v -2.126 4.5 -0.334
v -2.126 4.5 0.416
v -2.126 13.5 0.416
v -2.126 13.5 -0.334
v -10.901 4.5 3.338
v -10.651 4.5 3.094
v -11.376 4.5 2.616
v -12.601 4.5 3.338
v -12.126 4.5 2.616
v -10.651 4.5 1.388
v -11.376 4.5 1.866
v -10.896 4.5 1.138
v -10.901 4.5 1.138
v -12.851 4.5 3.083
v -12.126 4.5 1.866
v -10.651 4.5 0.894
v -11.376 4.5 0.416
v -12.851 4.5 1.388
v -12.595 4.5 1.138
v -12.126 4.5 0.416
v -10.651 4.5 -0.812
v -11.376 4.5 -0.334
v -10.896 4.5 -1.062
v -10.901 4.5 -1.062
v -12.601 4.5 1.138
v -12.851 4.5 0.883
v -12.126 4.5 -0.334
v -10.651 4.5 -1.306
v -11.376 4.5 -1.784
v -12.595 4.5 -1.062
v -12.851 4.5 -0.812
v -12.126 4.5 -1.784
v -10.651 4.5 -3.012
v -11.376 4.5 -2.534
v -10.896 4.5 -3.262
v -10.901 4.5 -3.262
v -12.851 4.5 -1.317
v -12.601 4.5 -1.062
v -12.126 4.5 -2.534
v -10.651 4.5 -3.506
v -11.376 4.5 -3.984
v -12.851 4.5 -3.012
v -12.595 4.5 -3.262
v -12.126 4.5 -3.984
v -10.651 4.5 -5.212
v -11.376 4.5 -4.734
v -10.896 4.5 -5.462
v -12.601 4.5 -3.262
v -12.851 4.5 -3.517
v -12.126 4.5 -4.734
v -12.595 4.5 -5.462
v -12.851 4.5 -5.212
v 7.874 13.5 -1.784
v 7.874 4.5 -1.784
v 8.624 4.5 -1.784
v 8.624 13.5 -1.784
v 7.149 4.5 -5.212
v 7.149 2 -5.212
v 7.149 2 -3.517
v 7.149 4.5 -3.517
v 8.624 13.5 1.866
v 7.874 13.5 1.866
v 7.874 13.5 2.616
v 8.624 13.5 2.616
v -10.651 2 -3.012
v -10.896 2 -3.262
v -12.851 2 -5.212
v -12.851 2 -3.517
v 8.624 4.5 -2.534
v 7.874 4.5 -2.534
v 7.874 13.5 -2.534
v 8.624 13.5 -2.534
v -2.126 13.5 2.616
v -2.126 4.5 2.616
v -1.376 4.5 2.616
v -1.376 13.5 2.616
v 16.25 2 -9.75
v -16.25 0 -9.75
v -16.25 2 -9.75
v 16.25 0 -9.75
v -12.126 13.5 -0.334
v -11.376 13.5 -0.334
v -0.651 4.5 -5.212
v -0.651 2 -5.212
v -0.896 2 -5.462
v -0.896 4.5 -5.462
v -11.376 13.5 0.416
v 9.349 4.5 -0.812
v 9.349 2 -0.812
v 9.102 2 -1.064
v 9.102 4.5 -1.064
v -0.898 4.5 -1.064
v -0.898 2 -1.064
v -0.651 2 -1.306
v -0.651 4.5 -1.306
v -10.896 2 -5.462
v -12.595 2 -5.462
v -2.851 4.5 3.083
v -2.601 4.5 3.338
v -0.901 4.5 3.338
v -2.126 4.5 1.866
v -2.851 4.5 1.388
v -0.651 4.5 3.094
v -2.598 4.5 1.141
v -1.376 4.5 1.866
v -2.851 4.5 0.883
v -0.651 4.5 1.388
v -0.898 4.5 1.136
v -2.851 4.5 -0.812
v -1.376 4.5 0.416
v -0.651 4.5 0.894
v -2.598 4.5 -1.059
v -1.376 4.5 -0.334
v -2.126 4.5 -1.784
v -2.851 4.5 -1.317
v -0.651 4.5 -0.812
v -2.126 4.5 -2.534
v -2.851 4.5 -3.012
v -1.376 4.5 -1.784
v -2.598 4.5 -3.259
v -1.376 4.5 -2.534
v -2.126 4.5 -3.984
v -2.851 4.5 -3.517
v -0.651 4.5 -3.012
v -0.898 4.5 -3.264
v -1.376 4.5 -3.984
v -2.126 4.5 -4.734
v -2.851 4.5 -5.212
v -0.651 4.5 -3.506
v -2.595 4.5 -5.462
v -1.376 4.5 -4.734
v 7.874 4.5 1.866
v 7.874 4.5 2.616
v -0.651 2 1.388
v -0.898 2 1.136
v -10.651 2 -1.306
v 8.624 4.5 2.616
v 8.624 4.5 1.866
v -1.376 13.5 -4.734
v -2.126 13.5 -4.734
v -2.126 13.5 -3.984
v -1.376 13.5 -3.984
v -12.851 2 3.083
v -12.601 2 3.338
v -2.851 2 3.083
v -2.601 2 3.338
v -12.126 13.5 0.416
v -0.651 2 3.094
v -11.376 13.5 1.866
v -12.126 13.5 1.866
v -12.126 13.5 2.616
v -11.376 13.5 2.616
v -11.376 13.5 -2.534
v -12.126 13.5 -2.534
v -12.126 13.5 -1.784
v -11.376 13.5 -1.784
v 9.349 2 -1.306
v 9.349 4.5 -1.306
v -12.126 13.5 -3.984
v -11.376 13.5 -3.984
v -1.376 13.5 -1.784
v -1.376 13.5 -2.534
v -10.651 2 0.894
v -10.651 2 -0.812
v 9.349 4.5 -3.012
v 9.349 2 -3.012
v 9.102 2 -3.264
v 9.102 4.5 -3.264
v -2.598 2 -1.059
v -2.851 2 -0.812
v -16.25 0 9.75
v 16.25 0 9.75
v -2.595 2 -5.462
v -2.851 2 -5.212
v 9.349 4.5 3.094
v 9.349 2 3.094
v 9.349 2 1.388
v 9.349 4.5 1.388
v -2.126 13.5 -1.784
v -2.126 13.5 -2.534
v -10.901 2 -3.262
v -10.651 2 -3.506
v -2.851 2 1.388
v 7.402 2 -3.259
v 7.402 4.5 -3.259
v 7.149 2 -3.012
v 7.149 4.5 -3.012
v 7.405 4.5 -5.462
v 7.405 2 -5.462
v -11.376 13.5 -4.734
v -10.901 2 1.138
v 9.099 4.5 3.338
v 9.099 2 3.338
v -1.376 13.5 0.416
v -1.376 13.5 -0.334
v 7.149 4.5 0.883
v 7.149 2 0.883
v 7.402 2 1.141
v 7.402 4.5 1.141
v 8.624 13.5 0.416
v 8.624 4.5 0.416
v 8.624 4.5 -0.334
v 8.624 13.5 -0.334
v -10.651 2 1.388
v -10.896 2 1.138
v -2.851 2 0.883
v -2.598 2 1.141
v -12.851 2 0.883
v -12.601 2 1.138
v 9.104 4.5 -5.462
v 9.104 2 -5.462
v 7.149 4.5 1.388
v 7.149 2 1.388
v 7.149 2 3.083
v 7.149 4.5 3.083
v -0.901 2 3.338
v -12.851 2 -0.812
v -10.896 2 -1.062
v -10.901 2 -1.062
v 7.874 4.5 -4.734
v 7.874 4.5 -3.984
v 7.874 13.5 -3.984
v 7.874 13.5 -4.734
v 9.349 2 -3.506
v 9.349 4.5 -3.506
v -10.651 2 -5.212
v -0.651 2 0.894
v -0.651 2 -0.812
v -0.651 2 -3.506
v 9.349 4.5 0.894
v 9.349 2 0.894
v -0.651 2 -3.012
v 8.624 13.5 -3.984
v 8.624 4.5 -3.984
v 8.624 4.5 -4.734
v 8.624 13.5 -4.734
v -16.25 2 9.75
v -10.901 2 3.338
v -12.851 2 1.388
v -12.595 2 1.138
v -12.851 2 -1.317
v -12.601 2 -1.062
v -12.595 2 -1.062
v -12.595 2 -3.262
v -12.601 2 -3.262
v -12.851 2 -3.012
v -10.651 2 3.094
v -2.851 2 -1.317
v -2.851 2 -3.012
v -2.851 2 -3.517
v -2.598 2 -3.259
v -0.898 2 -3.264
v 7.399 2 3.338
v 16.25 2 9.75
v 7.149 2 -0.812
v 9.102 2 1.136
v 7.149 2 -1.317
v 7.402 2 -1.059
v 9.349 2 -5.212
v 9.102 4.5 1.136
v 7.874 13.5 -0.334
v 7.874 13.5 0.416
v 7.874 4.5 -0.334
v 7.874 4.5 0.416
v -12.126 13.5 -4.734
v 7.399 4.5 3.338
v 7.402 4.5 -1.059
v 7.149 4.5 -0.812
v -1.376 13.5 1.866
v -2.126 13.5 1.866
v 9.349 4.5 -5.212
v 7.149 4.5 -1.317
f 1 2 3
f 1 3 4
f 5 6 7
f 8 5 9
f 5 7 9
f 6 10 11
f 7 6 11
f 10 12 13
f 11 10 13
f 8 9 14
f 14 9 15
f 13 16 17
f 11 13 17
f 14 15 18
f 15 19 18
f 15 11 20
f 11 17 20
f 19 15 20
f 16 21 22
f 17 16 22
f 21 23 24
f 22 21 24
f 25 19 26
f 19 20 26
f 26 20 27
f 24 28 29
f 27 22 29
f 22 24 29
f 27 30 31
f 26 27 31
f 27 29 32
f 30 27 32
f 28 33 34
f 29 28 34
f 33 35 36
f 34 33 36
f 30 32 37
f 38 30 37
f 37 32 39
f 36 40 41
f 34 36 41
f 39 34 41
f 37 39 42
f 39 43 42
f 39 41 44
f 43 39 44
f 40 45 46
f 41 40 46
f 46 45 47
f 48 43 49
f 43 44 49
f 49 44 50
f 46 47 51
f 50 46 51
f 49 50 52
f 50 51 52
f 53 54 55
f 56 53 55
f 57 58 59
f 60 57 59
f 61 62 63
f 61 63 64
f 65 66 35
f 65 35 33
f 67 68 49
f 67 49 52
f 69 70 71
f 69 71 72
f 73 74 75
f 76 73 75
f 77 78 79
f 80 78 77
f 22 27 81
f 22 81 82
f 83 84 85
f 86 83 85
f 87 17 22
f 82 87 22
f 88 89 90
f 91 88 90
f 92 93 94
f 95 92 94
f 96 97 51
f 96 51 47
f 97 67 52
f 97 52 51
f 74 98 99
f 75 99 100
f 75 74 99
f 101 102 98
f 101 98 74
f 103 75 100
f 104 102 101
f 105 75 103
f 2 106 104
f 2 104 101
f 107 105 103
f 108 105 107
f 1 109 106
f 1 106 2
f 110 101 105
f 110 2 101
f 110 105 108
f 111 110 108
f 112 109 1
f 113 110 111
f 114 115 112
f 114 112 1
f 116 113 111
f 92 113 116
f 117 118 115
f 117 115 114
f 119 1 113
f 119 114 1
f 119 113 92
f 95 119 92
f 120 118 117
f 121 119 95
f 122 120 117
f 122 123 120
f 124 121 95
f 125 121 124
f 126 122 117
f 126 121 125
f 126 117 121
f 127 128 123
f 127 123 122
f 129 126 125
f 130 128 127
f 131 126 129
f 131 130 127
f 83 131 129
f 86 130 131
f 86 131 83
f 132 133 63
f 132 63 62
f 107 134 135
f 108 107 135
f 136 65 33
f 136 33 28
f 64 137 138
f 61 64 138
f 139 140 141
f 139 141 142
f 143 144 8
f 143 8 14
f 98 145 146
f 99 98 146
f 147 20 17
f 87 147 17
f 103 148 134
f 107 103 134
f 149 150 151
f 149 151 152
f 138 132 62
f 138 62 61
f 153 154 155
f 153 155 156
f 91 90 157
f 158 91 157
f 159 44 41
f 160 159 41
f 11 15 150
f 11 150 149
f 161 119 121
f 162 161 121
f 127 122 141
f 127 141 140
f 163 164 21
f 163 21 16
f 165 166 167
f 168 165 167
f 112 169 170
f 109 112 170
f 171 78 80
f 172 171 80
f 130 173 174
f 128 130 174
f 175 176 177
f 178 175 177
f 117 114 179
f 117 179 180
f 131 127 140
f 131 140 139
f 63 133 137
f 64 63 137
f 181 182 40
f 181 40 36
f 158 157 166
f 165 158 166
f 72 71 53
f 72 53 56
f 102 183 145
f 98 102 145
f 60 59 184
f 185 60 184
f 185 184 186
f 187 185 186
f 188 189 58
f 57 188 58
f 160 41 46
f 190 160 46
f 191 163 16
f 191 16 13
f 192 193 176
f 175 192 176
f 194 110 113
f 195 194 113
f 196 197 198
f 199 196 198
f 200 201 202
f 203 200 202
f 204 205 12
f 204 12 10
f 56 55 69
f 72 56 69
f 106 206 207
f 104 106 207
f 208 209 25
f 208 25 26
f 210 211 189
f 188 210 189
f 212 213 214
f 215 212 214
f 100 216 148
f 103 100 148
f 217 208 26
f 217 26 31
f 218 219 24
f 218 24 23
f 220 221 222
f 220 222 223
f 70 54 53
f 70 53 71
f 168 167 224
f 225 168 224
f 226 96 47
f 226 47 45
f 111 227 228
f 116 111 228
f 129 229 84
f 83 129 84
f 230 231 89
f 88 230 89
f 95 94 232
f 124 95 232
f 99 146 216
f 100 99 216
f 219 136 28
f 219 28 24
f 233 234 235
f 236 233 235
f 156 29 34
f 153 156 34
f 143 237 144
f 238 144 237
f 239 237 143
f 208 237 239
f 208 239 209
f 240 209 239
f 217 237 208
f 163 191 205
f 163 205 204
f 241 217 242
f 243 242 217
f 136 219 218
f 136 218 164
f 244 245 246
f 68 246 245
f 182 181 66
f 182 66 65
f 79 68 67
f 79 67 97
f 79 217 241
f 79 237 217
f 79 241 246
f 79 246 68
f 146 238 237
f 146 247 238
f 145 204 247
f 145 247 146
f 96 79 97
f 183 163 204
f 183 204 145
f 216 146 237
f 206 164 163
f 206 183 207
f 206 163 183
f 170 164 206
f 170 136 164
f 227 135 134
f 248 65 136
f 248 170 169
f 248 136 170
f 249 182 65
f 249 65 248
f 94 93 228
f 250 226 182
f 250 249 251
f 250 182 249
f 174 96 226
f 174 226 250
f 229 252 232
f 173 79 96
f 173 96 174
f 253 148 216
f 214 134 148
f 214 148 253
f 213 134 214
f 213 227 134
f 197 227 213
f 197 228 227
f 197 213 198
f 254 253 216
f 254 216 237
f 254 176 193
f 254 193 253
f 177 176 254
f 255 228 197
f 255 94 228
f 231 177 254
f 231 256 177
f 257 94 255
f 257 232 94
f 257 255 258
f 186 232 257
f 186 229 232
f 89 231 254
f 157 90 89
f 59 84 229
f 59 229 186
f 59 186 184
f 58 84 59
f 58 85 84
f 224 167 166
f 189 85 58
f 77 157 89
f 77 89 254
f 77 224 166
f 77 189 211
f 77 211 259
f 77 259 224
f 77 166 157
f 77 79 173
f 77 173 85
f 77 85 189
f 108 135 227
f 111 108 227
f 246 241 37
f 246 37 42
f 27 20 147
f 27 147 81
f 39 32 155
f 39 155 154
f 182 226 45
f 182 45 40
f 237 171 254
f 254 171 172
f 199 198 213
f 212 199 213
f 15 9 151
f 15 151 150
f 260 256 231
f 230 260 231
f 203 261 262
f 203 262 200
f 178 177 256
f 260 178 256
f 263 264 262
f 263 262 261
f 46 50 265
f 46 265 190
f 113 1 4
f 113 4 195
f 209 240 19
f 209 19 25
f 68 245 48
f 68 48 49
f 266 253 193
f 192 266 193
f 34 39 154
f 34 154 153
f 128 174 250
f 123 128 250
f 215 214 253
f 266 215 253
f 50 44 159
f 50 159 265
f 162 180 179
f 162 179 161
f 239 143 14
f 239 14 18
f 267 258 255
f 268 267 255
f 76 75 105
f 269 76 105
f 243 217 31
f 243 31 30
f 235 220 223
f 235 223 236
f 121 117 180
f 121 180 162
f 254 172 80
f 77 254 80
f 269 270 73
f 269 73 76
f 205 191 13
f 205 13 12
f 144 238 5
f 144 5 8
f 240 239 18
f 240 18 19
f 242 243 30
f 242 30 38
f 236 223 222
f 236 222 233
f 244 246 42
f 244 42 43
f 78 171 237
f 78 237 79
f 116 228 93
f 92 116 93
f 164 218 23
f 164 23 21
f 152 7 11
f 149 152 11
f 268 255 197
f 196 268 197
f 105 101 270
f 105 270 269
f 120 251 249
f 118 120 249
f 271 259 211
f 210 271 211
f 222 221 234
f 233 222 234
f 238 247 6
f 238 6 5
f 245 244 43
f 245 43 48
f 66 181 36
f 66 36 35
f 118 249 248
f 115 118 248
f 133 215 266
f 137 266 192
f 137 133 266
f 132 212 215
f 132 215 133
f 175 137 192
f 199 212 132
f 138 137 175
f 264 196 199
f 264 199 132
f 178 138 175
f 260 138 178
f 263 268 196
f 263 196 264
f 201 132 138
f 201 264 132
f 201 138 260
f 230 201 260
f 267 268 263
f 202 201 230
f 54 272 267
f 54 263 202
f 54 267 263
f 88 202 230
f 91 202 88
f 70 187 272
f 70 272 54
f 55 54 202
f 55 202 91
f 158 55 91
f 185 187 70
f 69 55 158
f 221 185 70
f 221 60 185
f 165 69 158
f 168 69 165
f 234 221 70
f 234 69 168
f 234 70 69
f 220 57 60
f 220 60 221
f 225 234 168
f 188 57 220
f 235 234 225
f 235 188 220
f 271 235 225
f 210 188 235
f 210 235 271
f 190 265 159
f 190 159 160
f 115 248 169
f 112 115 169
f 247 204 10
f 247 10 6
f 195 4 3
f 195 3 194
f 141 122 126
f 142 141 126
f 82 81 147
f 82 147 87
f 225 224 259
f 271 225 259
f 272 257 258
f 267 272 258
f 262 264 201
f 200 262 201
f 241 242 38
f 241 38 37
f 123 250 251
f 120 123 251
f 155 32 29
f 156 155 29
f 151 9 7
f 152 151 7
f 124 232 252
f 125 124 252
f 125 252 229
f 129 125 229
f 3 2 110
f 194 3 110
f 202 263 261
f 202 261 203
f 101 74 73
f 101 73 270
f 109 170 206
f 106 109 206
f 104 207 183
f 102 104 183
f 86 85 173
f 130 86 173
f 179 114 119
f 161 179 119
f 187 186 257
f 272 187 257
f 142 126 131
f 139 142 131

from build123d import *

# Parameters (mm, degrees)
ESBO_O1_W                  = 32.5
ESBO_O1_H                  = 19.5
RESSALTO_EXTRUS_O1_DEPTH   = 2
RESSALTO_EXTRUS_O2_DEPTH   = 2.5
ESBO_O3_W                  = 0.75
ESBO_O3_H                  = 0.75
RESSALTO_EXTRUS_O3_DEPTH   = 9
PADR_O_LINEAR1_COUNT       = 4
PADR_O_LINEAR1_PITCH       = 2.2
PADR_O_START               = 2
PADR_O_LINEAR2_DEPTH       = 2.5
PADR_O_START_2             = 4.5
PADR_O_LINEAR2_2_OUTLINE_W = 0.75
PADR_O_LINEAR2_2_OUTLINE_H = 0.75
PADR_O_LINEAR2_2_DEPTH     = 9


# Read off the part's stored shape, not the designer's step: Padrão linear2
with BuildPart() as part:
    # Esboço1 → Ressalto-extrusão1 (new body)
    with BuildSketch(Plane(origin=(0, 0, 0), x_dir=(1, 0, 0), z_dir=(0, 1, 0))):
        Rectangle(ESBO_O1_W, ESBO_O1_H)
    extrude(amount=RESSALTO_EXTRUS_O1_DEPTH)

    # Esboço2 → Ressalto-extrusão2 (add)
    with BuildSketch(Plane(origin=(0, 2, 0), x_dir=(1, 0, 0), z_dir=(0, 1, 0))):
        Polygon((-12.851070796, 5.211508821), (-12.595390899, 5.461508821), (-10.895517077, 5.461508821), (-10.651070796, 5.211508821), (-10.651070796, 3.505955102), (-10.901070796, 3.261508821), (-12.601070796, 3.261508821), (-12.851070796, 3.517188718), align=None)
    ressalto_extrus_o2 = extrude(amount=RESSALTO_EXTRUS_O2_DEPTH)

    # Esboço3 → Ressalto-extrusão3 (add)
    with BuildSketch(Plane(origin=(0, 4.5, 0), x_dir=(1, 0, 0), z_dir=(0, 1, 0))):
        with Locations((-11.751070796, 4.358731961)):
            Rectangle(ESBO_O3_W, ESBO_O3_H)
    ressalto_extrus_o3 = extrude(amount=RESSALTO_EXTRUS_O3_DEPTH)

    # Padrão linear1: Ressalto-extrusão2, Ressalto-extrusão3 ×4
    with Locations(*[(0, 0, i * PADR_O_LINEAR1_PITCH) for i in range(1, PADR_O_LINEAR1_COUNT)]):
        add(ressalto_extrus_o2)
        add(ressalto_extrus_o3)

    # Padrão linear2 outline → Padrão linear2 (add)
    with BuildSketch(Plane(origin=(0, 0, 0), x_dir=(1, 0, 0), z_dir=(0, 1, 0)).offset(PADR_O_START)):
        Polygon((-0.895517077, 5.461508821), (-2.595390899, 5.461508821), (-2.851070796, 5.211508821), (-2.851070796, 3.517188718), (-2.598294638, 3.258669589), (-2.851070796, 3.011508821), (-2.851070796, 1.317188718), (-2.598294638, 1.058669589), (-2.851070796, 0.811508821), (-2.851070796, -0.882811282), (-2.598294638, -1.141330411), (-2.851070796, -1.388491179), (-2.851070796, -3.082811282), (-2.601070796, -3.338491179), (-0.901070796, -3.338491179), (-0.651070796, -3.094044898), (-0.651070796, -1.388491179), (-0.898231564, -1.13571502), (-0.651070796, -0.894044898), (-0.651070796, 0.811508821), (-0.898231564, 1.06428498), (-0.651070796, 1.305955102), (-0.651070796, 3.011508821), (-0.898231564, 3.26428498), (-0.651070796, 3.505955102), (-0.651070796, 5.211508821), align=None)
        Polygon((9.104482923, 5.461508821), (7.404609101, 5.461508821), (7.148929204, 5.211508821), (7.148929204, 3.517188718), (7.401705362, 3.258669589), (7.148929204, 3.011508821), (7.148929204, 1.317188718), (7.401705362, 1.058669589), (7.148929204, 0.811508821), (7.148929204, -0.882811282), (7.401705362, -1.141330411), (7.148929204, -1.388491179), (7.148929204, -3.082811282), (7.398929204, -3.338491179), (9.098929204, -3.338491179), (9.348929204, -3.094044898), (9.348929204, -1.388491179), (9.101768436, -1.13571502), (9.348929204, -0.894044898), (9.348929204, 0.811508821), (9.101768436, 1.06428498), (9.348929204, 1.305955102), (9.348929204, 3.011508821), (9.101768436, 3.26428498), (9.348929204, 3.505955102), (9.348929204, 5.211508821), align=None)
    extrude(amount=PADR_O_LINEAR2_DEPTH)

    # Padr_o linear2 2 outline → Padr_o linear2 2 (add)
    with BuildSketch(Plane(origin=(0, 0, 0), x_dir=(1, 0, 0), z_dir=(0, 1, 0)).offset(PADR_O_START_2)):
        with Locations((-1.751070796, 4.358731961)):
            Rectangle(PADR_O_LINEAR2_2_OUTLINE_W, PADR_O_LINEAR2_2_OUTLINE_H)
        with Locations((8.248929204, 4.358731961)):
            Rectangle(PADR_O_LINEAR2_2_OUTLINE_W, PADR_O_LINEAR2_2_OUTLINE_H)
        with Locations((-1.751070796, 2.158731961)):
            Rectangle(PADR_O_LINEAR2_2_OUTLINE_W, PADR_O_LINEAR2_2_OUTLINE_H)
        with Locations((8.248929204, 2.158731961)):
            Rectangle(PADR_O_LINEAR2_2_OUTLINE_W, PADR_O_LINEAR2_2_OUTLINE_H)
        with Locations((-1.751070796, -0.041268039)):
            Rectangle(PADR_O_LINEAR2_2_OUTLINE_W, PADR_O_LINEAR2_2_OUTLINE_H)
        with Locations((8.248929204, -0.041268039)):
            Rectangle(PADR_O_LINEAR2_2_OUTLINE_W, PADR_O_LINEAR2_2_OUTLINE_H)
        with Locations((-1.751070796, -2.241268039)):
            Rectangle(PADR_O_LINEAR2_2_OUTLINE_W, PADR_O_LINEAR2_2_OUTLINE_H)
        with Locations((8.248929204, -2.241268039)):
            Rectangle(PADR_O_LINEAR2_2_OUTLINE_W, PADR_O_LINEAR2_2_OUTLINE_H)
    extrude(amount=PADR_O_LINEAR2_2_DEPTH)


solid = part.part
